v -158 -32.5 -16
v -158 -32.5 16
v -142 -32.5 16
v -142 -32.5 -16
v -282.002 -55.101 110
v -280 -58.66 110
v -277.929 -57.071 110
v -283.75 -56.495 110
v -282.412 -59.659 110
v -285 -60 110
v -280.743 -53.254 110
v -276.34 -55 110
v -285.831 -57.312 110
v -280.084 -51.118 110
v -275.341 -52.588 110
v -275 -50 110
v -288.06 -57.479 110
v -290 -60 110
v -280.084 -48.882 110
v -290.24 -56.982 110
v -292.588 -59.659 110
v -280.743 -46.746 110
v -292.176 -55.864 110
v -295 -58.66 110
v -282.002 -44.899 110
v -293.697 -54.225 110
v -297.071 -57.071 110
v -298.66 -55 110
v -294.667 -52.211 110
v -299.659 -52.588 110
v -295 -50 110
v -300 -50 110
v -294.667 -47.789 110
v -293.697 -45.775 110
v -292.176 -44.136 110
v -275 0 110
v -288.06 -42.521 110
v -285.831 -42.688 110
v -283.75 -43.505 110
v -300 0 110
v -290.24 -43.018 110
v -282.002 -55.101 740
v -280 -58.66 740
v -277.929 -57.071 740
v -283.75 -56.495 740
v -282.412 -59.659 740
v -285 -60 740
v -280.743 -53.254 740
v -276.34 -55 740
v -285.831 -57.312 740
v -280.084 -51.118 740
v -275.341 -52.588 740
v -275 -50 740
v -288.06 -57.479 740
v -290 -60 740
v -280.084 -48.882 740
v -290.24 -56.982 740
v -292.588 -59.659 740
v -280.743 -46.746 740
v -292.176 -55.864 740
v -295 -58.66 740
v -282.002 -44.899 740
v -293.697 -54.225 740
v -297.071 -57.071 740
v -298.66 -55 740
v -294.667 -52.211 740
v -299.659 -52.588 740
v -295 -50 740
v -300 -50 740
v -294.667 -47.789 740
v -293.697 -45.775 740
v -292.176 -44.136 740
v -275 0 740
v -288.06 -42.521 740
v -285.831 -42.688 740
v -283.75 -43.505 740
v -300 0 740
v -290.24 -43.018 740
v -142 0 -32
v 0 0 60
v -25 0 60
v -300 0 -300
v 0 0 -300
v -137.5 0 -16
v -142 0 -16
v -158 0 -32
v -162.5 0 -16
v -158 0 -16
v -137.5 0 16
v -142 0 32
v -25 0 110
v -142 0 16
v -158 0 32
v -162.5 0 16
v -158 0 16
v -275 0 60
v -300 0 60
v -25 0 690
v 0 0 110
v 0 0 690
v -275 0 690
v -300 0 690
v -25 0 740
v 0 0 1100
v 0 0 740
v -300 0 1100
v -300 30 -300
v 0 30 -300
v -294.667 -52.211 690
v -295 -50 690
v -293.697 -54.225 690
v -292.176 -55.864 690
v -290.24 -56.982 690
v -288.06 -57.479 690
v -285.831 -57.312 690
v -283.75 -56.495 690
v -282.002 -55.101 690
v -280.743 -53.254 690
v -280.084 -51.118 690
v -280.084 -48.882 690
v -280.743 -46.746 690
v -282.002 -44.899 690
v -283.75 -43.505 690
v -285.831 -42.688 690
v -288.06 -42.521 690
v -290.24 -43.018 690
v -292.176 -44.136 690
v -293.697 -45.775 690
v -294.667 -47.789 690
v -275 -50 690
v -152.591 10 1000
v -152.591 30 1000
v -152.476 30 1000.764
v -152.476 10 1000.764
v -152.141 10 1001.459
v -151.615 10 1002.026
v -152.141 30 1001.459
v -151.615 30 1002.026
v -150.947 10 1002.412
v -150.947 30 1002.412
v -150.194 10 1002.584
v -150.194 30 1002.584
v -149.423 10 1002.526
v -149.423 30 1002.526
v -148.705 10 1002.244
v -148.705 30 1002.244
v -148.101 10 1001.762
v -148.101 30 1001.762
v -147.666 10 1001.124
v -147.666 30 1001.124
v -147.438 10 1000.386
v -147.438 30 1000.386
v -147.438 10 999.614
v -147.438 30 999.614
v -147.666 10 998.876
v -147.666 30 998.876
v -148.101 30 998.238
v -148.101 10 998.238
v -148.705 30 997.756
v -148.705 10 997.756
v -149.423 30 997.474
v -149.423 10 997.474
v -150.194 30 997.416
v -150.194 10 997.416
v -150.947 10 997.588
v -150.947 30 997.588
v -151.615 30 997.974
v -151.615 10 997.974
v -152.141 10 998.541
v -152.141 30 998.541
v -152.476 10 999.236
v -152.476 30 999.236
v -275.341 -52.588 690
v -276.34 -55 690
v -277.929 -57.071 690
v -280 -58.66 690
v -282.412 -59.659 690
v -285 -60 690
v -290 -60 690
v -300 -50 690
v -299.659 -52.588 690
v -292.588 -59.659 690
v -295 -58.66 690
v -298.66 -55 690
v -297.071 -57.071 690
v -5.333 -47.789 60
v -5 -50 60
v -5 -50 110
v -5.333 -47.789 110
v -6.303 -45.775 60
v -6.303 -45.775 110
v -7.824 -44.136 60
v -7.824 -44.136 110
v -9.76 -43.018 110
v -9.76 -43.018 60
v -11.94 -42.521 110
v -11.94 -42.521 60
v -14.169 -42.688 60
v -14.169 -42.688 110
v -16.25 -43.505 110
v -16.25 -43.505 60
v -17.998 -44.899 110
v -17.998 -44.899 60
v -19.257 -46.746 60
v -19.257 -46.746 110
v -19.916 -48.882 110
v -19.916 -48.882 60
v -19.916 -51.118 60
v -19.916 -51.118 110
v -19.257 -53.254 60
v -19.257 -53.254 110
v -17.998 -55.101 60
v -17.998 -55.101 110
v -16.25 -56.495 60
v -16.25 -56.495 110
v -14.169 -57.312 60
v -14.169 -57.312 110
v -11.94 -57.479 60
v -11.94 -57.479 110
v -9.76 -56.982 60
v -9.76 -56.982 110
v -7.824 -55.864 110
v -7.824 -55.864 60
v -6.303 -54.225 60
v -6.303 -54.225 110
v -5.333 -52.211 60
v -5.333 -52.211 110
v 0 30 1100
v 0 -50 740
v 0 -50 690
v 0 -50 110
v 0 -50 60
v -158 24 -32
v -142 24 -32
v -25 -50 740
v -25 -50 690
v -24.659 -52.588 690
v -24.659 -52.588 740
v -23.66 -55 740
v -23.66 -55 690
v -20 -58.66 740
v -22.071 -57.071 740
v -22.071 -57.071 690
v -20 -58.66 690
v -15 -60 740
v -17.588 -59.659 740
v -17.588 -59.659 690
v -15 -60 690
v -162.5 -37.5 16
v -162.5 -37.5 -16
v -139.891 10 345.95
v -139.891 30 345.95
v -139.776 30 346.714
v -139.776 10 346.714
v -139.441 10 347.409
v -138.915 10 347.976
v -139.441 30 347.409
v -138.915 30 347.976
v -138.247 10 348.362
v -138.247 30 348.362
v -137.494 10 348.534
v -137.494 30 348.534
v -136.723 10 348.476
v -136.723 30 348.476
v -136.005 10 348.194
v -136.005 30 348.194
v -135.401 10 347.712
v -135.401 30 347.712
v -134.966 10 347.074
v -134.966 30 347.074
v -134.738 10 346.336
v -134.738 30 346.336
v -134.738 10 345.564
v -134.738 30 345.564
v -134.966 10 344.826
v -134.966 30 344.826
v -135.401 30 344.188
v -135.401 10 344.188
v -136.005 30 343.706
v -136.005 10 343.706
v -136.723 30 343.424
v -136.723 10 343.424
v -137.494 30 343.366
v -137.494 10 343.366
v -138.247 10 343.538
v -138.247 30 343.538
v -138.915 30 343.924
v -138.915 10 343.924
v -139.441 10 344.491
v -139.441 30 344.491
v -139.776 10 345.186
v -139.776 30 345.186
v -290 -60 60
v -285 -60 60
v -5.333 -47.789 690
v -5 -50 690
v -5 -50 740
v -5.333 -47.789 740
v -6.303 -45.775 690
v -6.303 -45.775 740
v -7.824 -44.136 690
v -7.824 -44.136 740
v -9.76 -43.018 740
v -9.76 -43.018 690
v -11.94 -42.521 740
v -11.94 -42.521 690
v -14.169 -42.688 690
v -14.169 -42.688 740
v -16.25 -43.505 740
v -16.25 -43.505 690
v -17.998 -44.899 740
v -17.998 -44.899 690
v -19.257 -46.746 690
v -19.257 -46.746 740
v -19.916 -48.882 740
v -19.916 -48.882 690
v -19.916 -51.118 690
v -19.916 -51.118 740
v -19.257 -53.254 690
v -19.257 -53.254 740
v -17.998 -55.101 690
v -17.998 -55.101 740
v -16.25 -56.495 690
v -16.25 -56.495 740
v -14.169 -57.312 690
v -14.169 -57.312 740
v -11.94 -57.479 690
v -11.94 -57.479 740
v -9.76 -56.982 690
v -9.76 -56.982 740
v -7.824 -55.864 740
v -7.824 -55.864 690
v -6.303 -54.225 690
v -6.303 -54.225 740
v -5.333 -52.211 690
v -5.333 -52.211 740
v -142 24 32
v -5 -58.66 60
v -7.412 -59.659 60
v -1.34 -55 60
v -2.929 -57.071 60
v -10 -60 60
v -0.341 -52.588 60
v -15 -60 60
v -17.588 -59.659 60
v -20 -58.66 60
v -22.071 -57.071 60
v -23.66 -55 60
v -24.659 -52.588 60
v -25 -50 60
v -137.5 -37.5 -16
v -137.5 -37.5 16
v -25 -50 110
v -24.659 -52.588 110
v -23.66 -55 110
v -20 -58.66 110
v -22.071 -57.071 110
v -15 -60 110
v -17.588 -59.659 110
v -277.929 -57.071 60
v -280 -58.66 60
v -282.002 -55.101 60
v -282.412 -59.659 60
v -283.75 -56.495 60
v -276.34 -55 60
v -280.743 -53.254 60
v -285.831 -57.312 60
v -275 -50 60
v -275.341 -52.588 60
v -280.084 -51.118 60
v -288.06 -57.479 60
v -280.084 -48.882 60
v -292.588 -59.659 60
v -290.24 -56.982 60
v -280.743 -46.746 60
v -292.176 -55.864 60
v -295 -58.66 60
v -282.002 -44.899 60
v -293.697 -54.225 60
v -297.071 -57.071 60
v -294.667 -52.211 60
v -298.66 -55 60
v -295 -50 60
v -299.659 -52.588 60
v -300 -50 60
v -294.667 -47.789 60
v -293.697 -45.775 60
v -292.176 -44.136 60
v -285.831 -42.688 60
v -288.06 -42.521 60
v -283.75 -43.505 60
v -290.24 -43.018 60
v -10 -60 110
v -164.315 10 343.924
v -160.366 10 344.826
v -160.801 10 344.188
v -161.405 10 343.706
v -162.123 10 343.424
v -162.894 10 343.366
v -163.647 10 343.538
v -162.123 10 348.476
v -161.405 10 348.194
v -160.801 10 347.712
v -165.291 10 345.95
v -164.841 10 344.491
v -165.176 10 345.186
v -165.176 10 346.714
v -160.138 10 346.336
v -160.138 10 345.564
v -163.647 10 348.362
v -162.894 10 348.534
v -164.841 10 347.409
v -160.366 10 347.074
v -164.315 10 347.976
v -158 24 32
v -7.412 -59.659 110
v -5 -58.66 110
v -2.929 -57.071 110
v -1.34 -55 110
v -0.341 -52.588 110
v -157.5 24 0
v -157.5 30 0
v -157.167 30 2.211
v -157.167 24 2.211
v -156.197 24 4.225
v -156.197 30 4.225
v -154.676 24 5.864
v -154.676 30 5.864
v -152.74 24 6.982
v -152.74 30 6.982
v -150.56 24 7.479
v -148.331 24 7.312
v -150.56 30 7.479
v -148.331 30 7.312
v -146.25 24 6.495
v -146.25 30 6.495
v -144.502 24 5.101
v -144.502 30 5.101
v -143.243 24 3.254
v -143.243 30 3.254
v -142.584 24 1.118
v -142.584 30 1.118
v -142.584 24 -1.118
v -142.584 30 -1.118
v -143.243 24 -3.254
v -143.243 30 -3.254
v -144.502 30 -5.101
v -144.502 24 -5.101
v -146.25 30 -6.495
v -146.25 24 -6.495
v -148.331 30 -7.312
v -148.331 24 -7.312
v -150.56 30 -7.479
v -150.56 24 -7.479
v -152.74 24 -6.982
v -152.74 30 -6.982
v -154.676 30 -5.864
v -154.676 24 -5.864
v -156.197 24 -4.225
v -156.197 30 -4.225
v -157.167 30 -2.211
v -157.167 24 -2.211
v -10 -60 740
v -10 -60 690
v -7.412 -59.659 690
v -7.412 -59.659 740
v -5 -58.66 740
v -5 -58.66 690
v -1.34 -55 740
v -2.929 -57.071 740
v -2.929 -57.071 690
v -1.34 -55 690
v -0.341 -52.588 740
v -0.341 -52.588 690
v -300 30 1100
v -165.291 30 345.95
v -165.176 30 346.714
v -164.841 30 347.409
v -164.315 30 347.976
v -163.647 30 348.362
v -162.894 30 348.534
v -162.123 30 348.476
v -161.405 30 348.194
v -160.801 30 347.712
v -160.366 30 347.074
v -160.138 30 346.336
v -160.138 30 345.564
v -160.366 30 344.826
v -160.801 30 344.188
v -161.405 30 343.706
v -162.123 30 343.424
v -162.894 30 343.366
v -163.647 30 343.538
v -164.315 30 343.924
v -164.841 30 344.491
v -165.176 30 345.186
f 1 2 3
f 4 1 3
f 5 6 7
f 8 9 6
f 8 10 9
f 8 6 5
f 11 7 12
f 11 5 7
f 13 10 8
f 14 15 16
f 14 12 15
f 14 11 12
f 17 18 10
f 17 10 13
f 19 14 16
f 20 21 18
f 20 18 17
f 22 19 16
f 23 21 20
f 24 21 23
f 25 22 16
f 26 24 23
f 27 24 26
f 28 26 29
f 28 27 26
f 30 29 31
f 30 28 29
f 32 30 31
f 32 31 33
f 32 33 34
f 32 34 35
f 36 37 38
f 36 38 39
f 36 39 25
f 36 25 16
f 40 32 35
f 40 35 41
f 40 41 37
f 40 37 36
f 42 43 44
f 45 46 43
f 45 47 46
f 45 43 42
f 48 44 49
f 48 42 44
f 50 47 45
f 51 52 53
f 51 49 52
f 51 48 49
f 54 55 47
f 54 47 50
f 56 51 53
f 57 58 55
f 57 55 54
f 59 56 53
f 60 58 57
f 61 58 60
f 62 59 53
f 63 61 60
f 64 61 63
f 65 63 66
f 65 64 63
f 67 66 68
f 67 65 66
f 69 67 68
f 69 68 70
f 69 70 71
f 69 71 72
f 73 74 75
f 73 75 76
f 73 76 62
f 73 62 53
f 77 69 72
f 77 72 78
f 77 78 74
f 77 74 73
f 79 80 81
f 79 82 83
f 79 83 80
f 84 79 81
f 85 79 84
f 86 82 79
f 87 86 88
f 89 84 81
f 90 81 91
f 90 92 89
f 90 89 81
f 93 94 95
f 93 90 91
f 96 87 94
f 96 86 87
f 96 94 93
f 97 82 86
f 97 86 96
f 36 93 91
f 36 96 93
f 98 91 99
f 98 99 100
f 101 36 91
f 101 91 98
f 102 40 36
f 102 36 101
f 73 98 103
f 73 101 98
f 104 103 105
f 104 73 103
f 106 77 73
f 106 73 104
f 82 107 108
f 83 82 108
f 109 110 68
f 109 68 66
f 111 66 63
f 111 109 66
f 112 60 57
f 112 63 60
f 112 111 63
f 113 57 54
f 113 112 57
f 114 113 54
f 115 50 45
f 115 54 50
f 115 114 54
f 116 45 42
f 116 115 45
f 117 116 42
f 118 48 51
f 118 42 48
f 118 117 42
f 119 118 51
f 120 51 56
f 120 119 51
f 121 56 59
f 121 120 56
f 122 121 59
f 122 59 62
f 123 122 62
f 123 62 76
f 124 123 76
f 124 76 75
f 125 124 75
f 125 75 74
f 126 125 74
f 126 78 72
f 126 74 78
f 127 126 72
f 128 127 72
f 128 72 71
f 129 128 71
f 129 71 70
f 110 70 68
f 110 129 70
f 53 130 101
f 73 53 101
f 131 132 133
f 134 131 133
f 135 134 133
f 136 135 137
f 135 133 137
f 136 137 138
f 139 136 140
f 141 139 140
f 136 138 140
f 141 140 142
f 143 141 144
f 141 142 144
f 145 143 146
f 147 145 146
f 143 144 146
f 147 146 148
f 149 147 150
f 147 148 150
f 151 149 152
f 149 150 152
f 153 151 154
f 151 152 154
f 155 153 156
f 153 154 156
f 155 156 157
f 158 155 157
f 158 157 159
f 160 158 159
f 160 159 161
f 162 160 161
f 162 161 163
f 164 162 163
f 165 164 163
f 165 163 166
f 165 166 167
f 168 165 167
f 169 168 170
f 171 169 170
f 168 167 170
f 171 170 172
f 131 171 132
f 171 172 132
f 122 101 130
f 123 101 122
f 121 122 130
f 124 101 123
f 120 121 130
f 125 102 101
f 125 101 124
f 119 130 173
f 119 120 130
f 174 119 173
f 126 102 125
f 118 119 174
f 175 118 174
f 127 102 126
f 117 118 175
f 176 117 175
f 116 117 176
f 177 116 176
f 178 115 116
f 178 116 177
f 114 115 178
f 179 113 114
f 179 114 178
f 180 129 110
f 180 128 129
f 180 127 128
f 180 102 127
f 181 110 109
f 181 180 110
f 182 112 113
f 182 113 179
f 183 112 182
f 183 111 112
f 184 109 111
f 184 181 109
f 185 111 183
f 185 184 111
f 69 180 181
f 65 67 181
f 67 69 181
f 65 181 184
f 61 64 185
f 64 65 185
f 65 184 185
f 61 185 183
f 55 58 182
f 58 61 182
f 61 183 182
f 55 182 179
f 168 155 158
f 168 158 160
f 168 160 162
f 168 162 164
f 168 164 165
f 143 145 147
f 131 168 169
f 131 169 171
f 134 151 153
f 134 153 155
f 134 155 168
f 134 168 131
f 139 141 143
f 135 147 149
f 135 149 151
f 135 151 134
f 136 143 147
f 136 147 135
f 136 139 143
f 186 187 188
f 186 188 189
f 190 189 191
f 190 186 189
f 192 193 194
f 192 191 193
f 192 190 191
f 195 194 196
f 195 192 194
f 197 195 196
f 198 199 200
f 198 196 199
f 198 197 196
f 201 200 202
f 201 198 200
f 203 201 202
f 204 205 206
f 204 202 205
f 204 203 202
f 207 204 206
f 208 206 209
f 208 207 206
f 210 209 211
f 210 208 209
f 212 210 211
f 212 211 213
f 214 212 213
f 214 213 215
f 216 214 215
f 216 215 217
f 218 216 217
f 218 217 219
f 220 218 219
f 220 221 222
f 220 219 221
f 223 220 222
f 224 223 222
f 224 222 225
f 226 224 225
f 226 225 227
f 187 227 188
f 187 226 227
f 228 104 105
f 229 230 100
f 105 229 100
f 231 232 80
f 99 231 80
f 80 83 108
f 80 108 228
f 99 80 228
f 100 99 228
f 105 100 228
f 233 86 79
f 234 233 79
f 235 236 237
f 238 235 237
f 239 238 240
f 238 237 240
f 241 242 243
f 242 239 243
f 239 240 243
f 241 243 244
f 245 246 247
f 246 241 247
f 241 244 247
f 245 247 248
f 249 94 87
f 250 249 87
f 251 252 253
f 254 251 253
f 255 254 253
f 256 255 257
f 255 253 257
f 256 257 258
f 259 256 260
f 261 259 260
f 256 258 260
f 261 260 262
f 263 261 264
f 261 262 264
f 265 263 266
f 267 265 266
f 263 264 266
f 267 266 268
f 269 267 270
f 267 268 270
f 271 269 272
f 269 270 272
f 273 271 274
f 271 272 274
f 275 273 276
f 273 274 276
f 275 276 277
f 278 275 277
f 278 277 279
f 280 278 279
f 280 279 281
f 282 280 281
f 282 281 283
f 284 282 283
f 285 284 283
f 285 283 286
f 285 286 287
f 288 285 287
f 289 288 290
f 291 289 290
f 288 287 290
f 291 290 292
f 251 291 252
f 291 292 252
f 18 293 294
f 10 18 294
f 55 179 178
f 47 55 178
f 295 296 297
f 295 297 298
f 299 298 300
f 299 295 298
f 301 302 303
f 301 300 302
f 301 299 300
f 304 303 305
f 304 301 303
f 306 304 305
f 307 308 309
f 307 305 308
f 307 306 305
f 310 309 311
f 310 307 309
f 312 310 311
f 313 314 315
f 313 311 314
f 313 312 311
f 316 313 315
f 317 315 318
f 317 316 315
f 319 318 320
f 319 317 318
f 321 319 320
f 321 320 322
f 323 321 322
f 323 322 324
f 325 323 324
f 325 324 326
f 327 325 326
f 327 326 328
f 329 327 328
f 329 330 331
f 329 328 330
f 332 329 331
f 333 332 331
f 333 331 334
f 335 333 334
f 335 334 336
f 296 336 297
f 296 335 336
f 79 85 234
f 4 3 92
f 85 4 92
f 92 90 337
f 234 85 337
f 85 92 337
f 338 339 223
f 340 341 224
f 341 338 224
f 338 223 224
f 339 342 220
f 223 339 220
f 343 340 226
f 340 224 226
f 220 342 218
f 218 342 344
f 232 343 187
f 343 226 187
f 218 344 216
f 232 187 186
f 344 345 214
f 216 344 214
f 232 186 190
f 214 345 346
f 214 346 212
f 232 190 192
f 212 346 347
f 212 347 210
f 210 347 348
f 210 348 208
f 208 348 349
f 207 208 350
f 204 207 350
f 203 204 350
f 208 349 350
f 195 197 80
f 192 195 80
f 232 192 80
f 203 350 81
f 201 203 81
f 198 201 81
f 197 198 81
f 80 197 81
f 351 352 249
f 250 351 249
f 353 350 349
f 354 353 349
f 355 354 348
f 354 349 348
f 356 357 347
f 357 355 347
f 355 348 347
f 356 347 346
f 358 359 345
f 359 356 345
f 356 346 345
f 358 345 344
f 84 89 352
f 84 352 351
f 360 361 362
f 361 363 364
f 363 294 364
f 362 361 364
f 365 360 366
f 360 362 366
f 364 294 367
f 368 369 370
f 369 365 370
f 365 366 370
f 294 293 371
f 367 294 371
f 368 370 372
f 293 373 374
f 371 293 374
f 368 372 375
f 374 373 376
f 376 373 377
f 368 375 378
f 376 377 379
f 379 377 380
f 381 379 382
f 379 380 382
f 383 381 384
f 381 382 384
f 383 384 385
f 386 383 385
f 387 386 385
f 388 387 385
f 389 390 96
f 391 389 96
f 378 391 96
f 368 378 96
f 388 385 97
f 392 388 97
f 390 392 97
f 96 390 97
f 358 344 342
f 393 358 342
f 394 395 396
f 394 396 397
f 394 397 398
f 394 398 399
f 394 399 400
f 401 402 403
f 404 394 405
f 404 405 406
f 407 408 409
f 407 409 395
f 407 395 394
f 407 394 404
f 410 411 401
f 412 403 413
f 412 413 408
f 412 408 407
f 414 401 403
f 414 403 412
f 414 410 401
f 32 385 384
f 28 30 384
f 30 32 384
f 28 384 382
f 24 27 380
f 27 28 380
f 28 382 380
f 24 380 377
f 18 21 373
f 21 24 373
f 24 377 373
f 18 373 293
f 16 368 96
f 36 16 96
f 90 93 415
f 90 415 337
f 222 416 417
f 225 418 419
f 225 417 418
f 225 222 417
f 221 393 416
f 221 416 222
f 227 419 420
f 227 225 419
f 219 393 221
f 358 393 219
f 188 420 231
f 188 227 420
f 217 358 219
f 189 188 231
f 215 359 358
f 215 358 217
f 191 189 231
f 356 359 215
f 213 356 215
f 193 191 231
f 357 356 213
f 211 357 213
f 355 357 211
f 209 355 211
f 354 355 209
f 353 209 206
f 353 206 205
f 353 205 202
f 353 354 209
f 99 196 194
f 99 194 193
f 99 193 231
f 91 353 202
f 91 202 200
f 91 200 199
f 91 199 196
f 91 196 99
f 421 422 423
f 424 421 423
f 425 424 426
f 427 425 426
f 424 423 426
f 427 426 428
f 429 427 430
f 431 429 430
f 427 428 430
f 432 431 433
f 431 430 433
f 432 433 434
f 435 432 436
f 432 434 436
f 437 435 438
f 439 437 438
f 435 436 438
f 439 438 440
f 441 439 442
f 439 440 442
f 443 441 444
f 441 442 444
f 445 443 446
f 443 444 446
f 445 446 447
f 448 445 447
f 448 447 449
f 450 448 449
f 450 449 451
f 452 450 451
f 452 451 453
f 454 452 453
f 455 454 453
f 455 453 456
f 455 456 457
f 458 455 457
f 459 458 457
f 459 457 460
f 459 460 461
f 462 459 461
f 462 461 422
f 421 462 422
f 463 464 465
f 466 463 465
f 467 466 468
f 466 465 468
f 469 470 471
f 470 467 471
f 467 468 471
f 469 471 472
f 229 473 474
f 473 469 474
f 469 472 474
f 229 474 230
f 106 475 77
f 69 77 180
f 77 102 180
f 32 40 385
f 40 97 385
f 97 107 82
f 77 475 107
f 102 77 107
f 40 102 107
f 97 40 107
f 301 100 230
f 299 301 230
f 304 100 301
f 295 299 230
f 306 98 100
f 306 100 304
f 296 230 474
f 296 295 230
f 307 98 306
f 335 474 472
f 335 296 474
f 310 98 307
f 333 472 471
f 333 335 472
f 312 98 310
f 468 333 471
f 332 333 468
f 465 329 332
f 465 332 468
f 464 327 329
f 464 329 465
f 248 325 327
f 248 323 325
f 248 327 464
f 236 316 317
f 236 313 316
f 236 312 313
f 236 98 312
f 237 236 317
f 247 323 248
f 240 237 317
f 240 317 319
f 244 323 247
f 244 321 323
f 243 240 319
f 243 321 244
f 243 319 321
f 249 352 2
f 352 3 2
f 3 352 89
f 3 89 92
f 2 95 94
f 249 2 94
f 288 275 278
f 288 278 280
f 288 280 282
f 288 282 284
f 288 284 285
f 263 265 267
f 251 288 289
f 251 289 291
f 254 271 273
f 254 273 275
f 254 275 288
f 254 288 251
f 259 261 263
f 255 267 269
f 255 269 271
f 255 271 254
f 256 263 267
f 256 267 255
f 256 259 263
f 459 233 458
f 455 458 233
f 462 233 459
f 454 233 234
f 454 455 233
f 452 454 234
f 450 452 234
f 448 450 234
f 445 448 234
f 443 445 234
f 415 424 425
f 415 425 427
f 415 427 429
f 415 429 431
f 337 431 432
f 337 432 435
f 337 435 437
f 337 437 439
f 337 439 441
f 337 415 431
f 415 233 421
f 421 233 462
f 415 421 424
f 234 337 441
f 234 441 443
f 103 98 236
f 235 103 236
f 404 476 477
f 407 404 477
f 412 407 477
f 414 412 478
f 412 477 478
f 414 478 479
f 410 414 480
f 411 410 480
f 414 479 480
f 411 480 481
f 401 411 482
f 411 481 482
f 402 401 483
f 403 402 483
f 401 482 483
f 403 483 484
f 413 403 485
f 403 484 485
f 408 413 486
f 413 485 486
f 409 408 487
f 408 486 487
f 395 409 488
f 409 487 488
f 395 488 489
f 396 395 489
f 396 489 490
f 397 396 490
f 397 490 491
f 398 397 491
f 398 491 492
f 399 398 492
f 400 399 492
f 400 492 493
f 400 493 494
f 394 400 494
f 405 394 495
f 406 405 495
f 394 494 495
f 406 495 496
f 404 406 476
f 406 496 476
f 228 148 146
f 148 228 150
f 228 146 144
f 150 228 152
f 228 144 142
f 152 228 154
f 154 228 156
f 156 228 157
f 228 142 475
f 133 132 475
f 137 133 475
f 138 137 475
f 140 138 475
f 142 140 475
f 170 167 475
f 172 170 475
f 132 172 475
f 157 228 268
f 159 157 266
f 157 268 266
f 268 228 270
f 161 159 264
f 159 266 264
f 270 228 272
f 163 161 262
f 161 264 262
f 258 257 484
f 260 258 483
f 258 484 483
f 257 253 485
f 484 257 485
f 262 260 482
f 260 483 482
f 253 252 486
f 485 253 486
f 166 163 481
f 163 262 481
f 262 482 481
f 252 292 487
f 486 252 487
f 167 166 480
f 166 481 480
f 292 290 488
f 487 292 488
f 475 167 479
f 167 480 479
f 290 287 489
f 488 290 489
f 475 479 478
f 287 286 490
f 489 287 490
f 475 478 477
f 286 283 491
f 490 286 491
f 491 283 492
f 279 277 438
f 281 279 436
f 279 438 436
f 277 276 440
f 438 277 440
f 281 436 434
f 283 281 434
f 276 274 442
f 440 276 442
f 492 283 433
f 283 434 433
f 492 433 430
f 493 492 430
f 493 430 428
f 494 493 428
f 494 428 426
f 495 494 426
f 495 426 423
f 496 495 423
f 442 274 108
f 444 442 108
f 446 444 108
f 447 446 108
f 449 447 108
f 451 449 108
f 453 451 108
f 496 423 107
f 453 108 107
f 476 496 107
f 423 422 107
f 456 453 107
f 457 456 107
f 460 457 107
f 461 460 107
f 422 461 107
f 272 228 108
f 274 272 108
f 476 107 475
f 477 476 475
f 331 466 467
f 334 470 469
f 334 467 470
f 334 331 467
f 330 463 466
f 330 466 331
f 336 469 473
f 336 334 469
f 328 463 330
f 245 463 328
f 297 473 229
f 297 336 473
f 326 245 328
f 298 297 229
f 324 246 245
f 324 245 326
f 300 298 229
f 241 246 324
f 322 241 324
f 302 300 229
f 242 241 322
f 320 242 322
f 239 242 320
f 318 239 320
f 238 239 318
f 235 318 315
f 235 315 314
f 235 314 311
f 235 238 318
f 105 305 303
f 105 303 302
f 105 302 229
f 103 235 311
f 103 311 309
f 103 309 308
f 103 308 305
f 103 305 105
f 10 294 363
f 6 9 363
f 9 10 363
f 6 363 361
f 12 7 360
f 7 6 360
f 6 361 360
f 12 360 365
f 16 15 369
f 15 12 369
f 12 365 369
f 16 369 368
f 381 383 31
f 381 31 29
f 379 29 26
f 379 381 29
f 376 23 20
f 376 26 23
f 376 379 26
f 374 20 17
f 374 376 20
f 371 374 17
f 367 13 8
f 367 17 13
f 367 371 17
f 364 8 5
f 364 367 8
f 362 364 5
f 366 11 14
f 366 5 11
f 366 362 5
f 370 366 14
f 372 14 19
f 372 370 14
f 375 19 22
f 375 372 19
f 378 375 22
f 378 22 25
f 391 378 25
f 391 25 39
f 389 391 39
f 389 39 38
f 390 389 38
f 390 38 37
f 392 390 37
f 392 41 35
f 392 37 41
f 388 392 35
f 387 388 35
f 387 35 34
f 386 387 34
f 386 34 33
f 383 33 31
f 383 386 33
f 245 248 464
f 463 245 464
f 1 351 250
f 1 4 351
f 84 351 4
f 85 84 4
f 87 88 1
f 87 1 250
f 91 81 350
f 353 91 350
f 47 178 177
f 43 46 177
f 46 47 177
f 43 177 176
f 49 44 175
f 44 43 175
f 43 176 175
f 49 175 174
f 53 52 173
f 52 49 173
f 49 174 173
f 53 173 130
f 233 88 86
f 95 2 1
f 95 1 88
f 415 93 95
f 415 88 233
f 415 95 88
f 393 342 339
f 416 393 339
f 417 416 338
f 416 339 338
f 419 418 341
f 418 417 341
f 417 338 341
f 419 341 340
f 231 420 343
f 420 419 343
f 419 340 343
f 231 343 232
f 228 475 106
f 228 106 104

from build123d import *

# Parameters (mm, degrees)
BOSS_EXTRUDE1_DEPTH      = 1100
BOSS_EXTRUDE1_DEPTH_BACK = 300
SKETCH1_R                = 7.5
CUT_EXTRUDE1_DEPTH       = 1142.753038095
CUT_EXTRUDE1_DEPTH_BACK  = 1142.753038095
SKETCH3_W                = 360
SKETCH3_H                = 60
SKETCH4_R                = 7.5
CUT_EXTRUDE2_DEPTH       = 1144.721994193
SKETCH7_W                = 25
SKETCH7_H                = 32
BOSS_EXTRUDE2_DEPTH      = 37.5
SKETCH8_W                = 16
SKETCH8_H                = 32.5
CUT_EXTRUDE4_DEPTH       = 1127.346305538
SKETCH9_W                = 16
SKETCH9_H                = 64
CUT_EXTRUDE5_DEPTH       = 24
SKETCH10_R               = 2.5908
CUT_EXTRUDE6_DEPTH       = 20


with BuildPart() as part:
    # Sketch1 → Boss-Extrude1 (new, two sides: drawn at the far end of the back side and taken through both)
    with BuildSketch(Plane.XY.offset(-BOSS_EXTRUDE1_DEPTH_BACK)):
        with BuildLine():
            Line((0, 0), (0, 30))
            Line((0, 30), (-300, 30))
            Line((-300, 30), (-300, 0))
            Line((-300, 0), (-300, -50))
            ThreePointArc((-300, -50), (-297.071067812, -57.071067812), (-290, -60))
            Line((-290, -60), (-285, -60))
            ThreePointArc((-285, -60), (-277.928932188, -57.071067812), (-275, -50))
            Line((-275, -50), (-275, 0))
            Line((-275, 0), (-25, 0))
            Line((-25, 0), (-25, -50))
            ThreePointArc((-25, -50), (-22.071067812, -57.071067812), (-15, -60))
            Line((-15, -60), (-10, -60))
            ThreePointArc((-10, -60), (-2.928932188, -57.071067812), (0, -50))
            Line((0, -50), (0, 0))
        make_face()
        with Locations((-12.5, -50)):
            Circle(SKETCH1_R, mode=Mode.SUBTRACT)
        with Locations(Location((-287.5, -50, 0), (0, 0, 180))):
            Circle(SKETCH1_R, mode=Mode.SUBTRACT)
    extrude(amount=BOSS_EXTRUDE1_DEPTH + BOSS_EXTRUDE1_DEPTH_BACK)

    # Sketch3 → Cut-Extrude1 (cut, two sides: drawn at the far end of the back side and taken through both)
    with BuildSketch(Plane(origin=(0, 0, 0), x_dir=(0, 0, -1), z_dir=(1, 0, 0)).offset(-CUT_EXTRUDE1_DEPTH_BACK)):
        with Locations((-920, -30)):
            Rectangle(SKETCH3_W, SKETCH3_H)
        Polygon((0, 0), (300, 0), (300, -60), (0, -60), (-60, -60), (-60, 0), align=None)
        Polygon((-690, -60), (-110, -60), (-110, -50), (-110, 0), (-690, 0), (-690, -50), align=None)
    extrude(amount=CUT_EXTRUDE1_DEPTH + CUT_EXTRUDE1_DEPTH_BACK, mode=Mode.SUBTRACT)

    # Sketch4 → Cut-Extrude2 (cut, through all)
    with BuildSketch(Plane(origin=(0, 30, 0), x_dir=(1, 0, 0), z_dir=(0, 1, 0))):
        with Locations(Location((-150, 0, 0), (0, 0, 180))):
            Circle(SKETCH4_R)
    extrude(amount=-CUT_EXTRUDE2_DEPTH, mode=Mode.SUBTRACT)

    # Sketch7 → Boss-Extrude2 (add)
    with BuildSketch(Plane(origin=(0, 0, 0), x_dir=(-1, 0, 0), z_dir=(0, -1, 0))):
        with Locations((150, 0)):
            Rectangle(SKETCH7_W, SKETCH7_H)
    extrude(amount=BOSS_EXTRUDE2_DEPTH)

    # Sketch8 → Cut-Extrude4 (cut, through all)
    with BuildSketch(Plane.XY.offset(16)):
        with Locations((-150, -16.25)):
            Rectangle(SKETCH8_W, SKETCH8_H)
    extrude(amount=-CUT_EXTRUDE4_DEPTH, mode=Mode.SUBTRACT)

    # Sketch9 → Cut-Extrude5 (cut)
    with BuildSketch(Plane.XZ):
        with Locations((-150, 0)):
            Rectangle(SKETCH9_W, SKETCH9_H)
    extrude(amount=-CUT_EXTRUDE5_DEPTH, mode=Mode.SUBTRACT)

    # Sketch10 → Cut-Extrude6 (cut)
    with BuildSketch(Plane(origin=(0, 30, 0), x_dir=(1, 0, 0), z_dir=(0, 1, 0))):
        with Locations(Location((-150, -1000, 0), (0, 0, 180))):
            Circle(SKETCH10_R)
        with Locations(Location((-162.7, -345.95, 0), (0, 0, 180))):
            Circle(SKETCH10_R)
        with Locations(Location((-137.3, -345.95, 0), (0, 0, 180))):
            Circle(SKETCH10_R)
    extrude(amount=-CUT_EXTRUDE6_DEPTH, mode=Mode.SUBTRACT)


solid = part.part
